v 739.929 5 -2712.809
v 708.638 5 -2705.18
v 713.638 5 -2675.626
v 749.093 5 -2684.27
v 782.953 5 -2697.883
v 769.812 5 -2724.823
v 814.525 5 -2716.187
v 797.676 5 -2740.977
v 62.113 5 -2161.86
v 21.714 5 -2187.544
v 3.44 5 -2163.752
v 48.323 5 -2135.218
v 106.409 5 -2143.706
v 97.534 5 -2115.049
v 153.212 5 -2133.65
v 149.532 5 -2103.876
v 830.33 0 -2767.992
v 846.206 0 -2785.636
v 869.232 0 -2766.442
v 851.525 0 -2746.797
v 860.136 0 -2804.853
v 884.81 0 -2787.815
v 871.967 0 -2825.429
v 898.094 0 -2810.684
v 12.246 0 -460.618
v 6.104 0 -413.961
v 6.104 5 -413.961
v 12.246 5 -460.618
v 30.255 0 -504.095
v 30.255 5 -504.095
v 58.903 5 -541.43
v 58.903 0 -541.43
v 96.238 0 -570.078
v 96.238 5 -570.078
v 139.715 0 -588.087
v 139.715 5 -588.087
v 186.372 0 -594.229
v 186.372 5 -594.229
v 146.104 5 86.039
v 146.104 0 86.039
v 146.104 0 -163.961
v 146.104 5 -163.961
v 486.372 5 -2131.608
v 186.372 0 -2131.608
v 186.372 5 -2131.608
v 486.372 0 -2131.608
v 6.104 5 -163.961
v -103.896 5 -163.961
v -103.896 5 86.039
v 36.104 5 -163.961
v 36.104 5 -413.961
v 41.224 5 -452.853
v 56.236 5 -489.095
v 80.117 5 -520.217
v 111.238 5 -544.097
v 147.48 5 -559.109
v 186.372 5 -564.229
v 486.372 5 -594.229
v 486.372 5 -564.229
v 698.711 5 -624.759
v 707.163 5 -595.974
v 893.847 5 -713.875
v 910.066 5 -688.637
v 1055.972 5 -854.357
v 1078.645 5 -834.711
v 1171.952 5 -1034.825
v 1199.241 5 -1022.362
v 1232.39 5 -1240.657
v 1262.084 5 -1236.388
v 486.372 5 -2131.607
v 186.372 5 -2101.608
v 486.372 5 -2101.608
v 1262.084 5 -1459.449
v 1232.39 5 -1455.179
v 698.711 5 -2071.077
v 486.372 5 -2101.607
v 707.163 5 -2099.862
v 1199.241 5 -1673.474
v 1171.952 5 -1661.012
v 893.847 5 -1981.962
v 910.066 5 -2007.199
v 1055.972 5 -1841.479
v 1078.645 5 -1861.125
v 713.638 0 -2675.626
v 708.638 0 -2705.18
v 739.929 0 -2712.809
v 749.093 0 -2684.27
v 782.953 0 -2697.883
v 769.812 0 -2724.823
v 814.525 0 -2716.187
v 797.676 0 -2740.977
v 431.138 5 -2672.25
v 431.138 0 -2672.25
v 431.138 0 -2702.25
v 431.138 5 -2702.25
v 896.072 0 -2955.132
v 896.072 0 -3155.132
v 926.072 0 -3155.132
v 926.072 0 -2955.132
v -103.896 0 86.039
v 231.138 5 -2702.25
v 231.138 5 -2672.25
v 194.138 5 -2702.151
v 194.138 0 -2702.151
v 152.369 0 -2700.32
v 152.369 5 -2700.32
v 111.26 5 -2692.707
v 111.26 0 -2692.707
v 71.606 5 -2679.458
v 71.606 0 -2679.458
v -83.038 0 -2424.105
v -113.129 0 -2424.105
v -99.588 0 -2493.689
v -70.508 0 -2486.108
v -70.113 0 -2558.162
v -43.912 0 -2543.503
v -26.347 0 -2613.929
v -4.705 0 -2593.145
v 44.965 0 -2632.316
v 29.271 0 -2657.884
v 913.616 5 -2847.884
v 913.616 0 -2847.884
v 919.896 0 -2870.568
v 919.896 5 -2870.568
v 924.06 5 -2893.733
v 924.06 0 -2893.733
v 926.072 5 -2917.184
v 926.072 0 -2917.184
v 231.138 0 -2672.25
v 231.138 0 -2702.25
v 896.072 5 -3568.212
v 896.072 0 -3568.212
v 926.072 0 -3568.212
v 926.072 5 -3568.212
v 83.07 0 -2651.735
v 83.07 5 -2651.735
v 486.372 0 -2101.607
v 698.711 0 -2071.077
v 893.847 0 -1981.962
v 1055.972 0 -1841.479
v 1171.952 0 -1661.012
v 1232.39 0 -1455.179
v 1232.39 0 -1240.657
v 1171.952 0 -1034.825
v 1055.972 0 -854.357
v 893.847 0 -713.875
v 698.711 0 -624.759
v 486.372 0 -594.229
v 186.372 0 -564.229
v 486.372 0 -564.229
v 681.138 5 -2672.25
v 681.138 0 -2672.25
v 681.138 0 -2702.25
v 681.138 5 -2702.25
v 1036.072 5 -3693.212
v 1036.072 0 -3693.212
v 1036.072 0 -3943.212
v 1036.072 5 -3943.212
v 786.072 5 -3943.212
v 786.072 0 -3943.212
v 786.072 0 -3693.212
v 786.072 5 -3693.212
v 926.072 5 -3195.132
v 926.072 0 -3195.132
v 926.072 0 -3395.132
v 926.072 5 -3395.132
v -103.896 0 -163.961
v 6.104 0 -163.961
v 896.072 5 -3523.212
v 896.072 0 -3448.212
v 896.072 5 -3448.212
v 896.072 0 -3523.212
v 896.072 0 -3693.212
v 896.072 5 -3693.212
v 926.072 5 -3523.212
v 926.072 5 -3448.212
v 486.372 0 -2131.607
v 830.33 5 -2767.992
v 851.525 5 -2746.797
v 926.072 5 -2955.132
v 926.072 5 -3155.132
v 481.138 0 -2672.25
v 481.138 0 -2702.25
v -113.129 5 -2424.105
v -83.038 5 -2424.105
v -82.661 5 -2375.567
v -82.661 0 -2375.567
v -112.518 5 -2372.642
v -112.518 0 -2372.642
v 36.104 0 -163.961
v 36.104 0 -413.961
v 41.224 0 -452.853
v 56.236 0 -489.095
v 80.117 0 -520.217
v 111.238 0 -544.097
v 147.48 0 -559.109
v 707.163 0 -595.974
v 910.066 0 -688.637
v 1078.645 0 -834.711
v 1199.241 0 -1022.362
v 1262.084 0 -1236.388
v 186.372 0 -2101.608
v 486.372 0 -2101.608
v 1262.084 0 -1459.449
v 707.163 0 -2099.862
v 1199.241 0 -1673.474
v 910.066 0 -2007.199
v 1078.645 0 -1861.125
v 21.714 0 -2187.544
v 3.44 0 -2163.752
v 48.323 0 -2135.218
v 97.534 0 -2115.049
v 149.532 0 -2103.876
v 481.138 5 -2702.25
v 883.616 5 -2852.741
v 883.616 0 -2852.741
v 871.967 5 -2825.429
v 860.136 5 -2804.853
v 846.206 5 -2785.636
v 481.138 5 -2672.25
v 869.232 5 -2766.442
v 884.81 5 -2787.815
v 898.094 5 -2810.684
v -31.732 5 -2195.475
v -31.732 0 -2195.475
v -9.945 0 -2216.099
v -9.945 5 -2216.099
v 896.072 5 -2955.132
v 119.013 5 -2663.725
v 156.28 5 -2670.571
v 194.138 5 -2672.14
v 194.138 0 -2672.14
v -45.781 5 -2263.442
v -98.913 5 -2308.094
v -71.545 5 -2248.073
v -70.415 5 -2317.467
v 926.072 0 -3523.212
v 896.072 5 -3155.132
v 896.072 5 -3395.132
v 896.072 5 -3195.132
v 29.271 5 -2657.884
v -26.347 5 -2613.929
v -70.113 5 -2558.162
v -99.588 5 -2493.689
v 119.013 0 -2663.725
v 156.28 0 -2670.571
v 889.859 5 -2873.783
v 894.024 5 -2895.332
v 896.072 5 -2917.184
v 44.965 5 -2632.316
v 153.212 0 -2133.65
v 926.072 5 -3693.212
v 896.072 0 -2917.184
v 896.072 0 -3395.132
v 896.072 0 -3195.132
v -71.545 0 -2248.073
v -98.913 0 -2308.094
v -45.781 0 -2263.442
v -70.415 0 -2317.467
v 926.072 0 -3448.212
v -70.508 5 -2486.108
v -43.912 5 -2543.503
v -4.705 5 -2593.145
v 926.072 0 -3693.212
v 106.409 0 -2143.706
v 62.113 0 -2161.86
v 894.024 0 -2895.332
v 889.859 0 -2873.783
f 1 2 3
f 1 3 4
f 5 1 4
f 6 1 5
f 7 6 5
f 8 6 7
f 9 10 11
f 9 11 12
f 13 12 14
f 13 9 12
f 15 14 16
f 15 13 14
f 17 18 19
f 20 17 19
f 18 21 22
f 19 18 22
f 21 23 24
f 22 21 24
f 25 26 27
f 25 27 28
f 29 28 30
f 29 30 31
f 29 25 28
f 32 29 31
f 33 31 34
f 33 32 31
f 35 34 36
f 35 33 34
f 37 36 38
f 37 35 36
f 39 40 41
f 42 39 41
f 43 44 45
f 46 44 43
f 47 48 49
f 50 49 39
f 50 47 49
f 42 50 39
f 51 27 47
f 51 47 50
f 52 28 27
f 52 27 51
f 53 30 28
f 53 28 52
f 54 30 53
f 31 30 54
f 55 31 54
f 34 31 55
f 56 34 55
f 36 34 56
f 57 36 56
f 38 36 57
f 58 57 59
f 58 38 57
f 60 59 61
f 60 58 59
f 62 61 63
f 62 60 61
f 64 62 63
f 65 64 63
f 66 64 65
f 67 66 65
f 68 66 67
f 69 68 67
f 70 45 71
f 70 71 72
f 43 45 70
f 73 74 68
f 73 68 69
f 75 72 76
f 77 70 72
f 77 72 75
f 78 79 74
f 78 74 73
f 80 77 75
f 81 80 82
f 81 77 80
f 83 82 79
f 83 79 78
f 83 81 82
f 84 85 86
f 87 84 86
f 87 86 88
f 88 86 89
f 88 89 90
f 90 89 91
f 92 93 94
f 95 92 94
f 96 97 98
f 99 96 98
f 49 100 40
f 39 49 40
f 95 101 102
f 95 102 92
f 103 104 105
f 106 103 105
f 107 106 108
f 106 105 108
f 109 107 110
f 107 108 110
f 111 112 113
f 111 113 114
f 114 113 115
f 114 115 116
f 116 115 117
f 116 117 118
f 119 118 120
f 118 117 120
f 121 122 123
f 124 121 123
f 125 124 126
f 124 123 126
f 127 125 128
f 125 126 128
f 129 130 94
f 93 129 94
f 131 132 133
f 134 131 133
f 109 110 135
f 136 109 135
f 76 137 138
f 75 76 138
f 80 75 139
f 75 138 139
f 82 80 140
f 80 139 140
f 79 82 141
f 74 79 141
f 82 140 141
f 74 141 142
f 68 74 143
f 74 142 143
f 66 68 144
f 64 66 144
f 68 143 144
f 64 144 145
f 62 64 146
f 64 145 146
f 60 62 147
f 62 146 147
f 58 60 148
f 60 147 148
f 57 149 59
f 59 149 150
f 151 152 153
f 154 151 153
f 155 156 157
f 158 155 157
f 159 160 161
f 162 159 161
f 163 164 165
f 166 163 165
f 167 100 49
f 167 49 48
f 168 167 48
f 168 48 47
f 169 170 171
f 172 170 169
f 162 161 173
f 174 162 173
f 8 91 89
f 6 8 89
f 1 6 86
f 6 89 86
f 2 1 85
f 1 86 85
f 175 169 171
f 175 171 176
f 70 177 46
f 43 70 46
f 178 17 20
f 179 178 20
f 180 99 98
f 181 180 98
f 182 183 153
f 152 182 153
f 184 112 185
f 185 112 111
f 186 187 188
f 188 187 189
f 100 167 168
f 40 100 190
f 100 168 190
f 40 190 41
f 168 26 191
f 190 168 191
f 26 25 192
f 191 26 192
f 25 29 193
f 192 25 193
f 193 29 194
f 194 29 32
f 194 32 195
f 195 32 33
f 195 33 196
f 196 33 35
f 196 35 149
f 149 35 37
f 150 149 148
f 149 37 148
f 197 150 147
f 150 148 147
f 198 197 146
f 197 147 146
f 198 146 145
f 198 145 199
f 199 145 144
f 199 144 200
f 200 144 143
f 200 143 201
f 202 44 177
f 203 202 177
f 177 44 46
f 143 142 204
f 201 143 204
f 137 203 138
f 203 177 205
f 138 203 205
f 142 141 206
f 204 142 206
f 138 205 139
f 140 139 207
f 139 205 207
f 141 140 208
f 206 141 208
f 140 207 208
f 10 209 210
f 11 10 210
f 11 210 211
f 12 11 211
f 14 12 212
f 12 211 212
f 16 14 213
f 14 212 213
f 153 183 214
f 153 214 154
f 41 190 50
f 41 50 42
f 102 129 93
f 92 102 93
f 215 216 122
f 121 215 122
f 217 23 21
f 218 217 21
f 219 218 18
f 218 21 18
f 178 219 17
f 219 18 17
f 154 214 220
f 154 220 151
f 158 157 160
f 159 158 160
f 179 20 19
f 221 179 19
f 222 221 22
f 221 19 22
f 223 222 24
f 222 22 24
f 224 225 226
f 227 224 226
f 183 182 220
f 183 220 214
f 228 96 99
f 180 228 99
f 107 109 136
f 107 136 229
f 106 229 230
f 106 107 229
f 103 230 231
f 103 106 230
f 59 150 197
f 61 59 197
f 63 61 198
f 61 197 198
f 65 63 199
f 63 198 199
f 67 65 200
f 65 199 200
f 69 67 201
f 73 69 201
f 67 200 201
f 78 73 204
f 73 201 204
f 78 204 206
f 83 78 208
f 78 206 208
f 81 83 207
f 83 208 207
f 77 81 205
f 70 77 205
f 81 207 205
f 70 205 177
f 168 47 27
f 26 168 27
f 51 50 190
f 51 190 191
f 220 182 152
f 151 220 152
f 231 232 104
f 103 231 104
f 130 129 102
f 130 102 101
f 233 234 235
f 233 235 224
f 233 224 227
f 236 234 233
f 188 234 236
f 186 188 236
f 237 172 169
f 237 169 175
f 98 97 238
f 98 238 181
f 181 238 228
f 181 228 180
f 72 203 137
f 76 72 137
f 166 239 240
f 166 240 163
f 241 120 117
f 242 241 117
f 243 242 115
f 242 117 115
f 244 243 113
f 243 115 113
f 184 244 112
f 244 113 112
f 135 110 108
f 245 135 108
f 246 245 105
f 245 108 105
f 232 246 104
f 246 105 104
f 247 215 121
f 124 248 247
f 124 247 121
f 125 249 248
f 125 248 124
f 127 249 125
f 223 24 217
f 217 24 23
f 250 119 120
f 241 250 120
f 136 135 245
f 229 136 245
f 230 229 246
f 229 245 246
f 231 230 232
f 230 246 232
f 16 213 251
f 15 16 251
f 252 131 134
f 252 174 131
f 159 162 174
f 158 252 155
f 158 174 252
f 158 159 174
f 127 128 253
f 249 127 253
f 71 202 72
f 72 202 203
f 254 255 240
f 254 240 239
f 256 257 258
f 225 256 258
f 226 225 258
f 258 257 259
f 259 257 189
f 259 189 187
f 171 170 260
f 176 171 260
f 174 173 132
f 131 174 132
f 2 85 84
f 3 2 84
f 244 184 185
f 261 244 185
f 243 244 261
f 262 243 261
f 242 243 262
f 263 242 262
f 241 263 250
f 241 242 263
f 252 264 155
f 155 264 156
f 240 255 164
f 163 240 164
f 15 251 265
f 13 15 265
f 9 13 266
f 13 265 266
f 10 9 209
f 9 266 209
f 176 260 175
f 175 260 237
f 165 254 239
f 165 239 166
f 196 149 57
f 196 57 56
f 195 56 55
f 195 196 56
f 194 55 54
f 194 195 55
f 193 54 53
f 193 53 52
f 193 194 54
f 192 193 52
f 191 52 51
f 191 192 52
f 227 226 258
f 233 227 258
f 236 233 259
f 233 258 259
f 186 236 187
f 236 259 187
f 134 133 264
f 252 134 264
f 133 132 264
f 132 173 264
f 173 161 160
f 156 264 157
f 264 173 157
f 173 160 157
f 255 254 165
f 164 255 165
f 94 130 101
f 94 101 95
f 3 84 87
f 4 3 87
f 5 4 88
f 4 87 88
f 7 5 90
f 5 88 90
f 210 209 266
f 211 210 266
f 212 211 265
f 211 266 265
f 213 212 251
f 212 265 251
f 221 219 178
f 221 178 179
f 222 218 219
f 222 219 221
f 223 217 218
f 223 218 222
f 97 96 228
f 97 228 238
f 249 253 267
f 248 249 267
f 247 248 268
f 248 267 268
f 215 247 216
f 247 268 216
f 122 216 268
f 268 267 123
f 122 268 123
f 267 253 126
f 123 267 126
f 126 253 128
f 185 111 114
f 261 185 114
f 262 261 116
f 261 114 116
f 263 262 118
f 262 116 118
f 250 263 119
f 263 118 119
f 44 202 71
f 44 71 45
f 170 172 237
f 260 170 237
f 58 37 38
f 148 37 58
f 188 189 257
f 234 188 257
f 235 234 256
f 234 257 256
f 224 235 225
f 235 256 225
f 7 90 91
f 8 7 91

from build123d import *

# Parameters (mm, degrees)
SKETCH1_W              = 250
SKETCH1_H              = 250
BOSS_EXTRUDE1_DEPTH    = 5
SKETCH2_W              = 30
SKETCH2_H              = 250
BOSS_EXTRUDE2_DEPTH    = 5
BOSS_EXTRUDE3_DEPTH    = 5
SKETCH7_W              = 300
SKETCH7_H              = 30
BOSS_EXTRUDE4_DEPTH    = 5
BOSS_EXTRUDE5_DEPTH    = 5
SKETCH10_W             = 300
SKETCH10_H             = 30
BOSS_EXTRUDE6_DEPTH    = 5
BOSS_EXTRUDE7_DEPTH    = 5
BOSS_EXTRUDE7_2_DEPTH  = 5
BOSS_EXTRUDE7_3_DEPTH  = 5
BOSS_EXTRUDE7_4_DEPTH  = 5
SKETCH12_W             = 200
SKETCH12_H             = 30
BOSS_EXTRUDE8_DEPTH    = 5
BOSS_EXTRUDE8_2_DEPTH  = 5
BOSS_EXTRUDE9_DEPTH    = 5
BOSS_EXTRUDE9_2_DEPTH  = 5
BOSS_EXTRUDE9_3_DEPTH  = 5
SKETCH14_W             = 30
SKETCH14_H             = 200
BOSS_EXTRUDE10_DEPTH   = 5
BOSS_EXTRUDE10_2_DEPTH = 5
SKETCH14_H_2           = 75
BOSS_EXTRUDE10_3_DEPTH = 5
BOSS_EXTRUDE10_4_DEPTH = 5


with BuildPart() as part:
    # Sketch1 → Boss-Extrude1 (new body)
    with BuildSketch(Plane(origin=(0, 0, 0), x_dir=(1, 0, 0), z_dir=(0, 1, 0))):
        with Locations((21.103896104, 38.961038961)):
            Rectangle(SKETCH1_W, SKETCH1_H)
    extrude(amount=BOSS_EXTRUDE1_DEPTH)



with BuildPart() as body_2:
    # Sketch2 → Boss-Extrude2 (new body)
    with BuildSketch(Plane(origin=(0, 5, 0), x_dir=(1, 0, 0), z_dir=(0, 1, 0))):
        with Locations((21.103896104, 288.961038961)):
            Rectangle(SKETCH2_W, SKETCH2_H)
    extrude(amount=-BOSS_EXTRUDE2_DEPTH)

    # Sketch6 → Boss-Extrude3 (add)
    with BuildSketch(Plane(origin=(0, 0, 0), x_dir=(1, 0, 0), z_dir=(0, 1, 0))):
        with BuildLine():
            Line((186.372355095, 594.229497953), (186.372355095, 564.229497953))
            ThreePointArc((186.372355095, 564.229497953), (80.116508744, 520.216885312), (36.103896104, 413.961038961))
            Line((36.103896104, 413.961038961), (6.103896104, 413.961038961))
            ThreePointArc((6.103896104, 413.961038961), (58.903305308, 541.430088748), (186.372355095, 594.229497953))
        make_face()
    extrude(amount=BOSS_EXTRUDE3_DEPTH)

    # Sketch7 → Boss-Extrude4 (add)
    with BuildSketch(Plane(origin=(0, 0, 0), x_dir=(1, 0, 0), z_dir=(0, 1, 0))):
        with Locations((336.372355095, 579.229497953)):
            Rectangle(SKETCH7_W, SKETCH7_H)
    extrude(amount=BOSS_EXTRUDE4_DEPTH)


with BuildPart() as part_1:
    add(part.part)

    add(body_2.part)  # Boss-Extrude5 merges body 2
    # Sketch8 → Boss-Extrude5 (add)
    with BuildSketch(Plane(origin=(0, 0, 0), x_dir=(1, 0, 0), z_dir=(0, 1, 0))):
        with BuildLine():
            Line((486.372355095, 2131.607057749), (486.372355095, 2101.607057749))
            ThreePointArc((486.372355095, 2101.607057749), (1240.061134994, 1347.918277851), (486.372355095, 594.229497953))
            Line((486.372355095, 594.229497953), (186.372355095, 594.229497953))
            ThreePointArc((186.372355095, 594.229497953), (58.903305308, 541.430088748), (6.103896104, 413.961038961))
            Line((6.103896104, 413.961038961), (6.103896104, 163.961038961))
            Line((6.103896104, 163.961038961), (36.103896104, 163.961038961))
            Line((36.103896104, 163.961038961), (36.103896104, 413.961038961))
            ThreePointArc((36.103896104, 413.961038961), (80.116508744, 520.216885312), (186.372355095, 564.229497953))
            Line((186.372355095, 564.229497953), (486.372355095, 564.229497953))
            ThreePointArc((486.372355095, 564.229497953), (1270.061134994, 1347.918277851), (486.372355095, 2131.607057749))
        make_face()
    extrude(amount=BOSS_EXTRUDE5_DEPTH)

    # Sketch10 → Boss-Extrude6 (add)
    with BuildSketch(Plane(origin=(0, 0, 0), x_dir=(1, 0, 0), z_dir=(0, 1, 0))):
        with Locations((336.372355095, 2116.608277851)):
            Rectangle(SKETCH10_W, SKETCH10_H)
    extrude(amount=BOSS_EXTRUDE6_DEPTH)


with BuildPart() as body_2_2:
    # Sketch11 → Boss-Extrude7 (new body)
    with BuildSketch(Plane(origin=(0, 0, 0), x_dir=(1, 0, 0), z_dir=(0, 1, 0))):
        with BuildLine():
            Line((194.138193135, 2672.13994615), (194.138193135, 2702.151095344))
            ThreePointArc((194.138193135, 2702.151095344), (131.681935279, 2697.229802428), (71.605683596, 2679.457710455))
            Line((71.605683596, 2679.457710455), (83.070060163, 2651.7346502))
            ThreePointArc((83.070060163, 2651.7346502), (137.526703553, 2667.801823345), (194.138193135, 2672.13994615))
        make_face()
    extrude(amount=BOSS_EXTRUDE7_DEPTH)


with BuildPart() as body_3:
    # Sketch11 → Boss-Extrude7 2 (new body)
    with BuildSketch(Plane(origin=(0, 0, 0), x_dir=(1, 0, 0), z_dir=(0, 1, 0))):
        with BuildLine():
            Line((44.964556313, 2632.315689233), (29.271272289, 2657.883654278))
            ThreePointArc((29.271272289, 2657.883654278), (-70.112980729, 2558.161610757), (-113.129498421, 2424.104552318))
            Line((-113.129498421, 2424.104552318), (-83.038229419, 2424.104552318))
            ThreePointArc((-83.038229419, 2424.104552318), (-43.912046021, 2543.502751874), (44.964556313, 2632.315689233))
        make_face()
    extrude(amount=BOSS_EXTRUDE7_2_DEPTH)


with BuildPart() as body_4:
    # Sketch11 → Boss-Extrude7 3 (new body)
    with BuildSketch(Plane(origin=(0, 0, 0), x_dir=(1, 0, 0), z_dir=(0, 1, 0))):
        with BuildLine():
            Line((-82.66072222, 2375.567393394), (-112.51772113, 2372.641711242))
            ThreePointArc((-112.51772113, 2372.641711242), (-86.881851845, 2277.329681582), (-31.732320704, 2195.475481892))
            Line((-31.732320704, 2195.475481892), (-9.945210372, 2216.098813907))
            ThreePointArc((-9.945210372, 2216.098813907), (-59.585694469, 2289.776359551), (-82.66072222, 2375.567393394))
        make_face()
    extrude(amount=BOSS_EXTRUDE7_3_DEPTH)


with BuildPart() as body_5:
    # Sketch11 → Boss-Extrude7 4 (new body)
    with BuildSketch(Plane(origin=(0, 0, 0), x_dir=(1, 0, 0), z_dir=(0, 1, 0))):
        with BuildLine():
            Line((21.713850904, 2187.543901905), (3.44022883, 2163.751576749))
            ThreePointArc((3.44022883, 2163.751576749), (72.481138399, 2124.041671747), (149.53232629, 2103.876399771))
            Line((149.53232629, 2103.876399771), (153.212383901, 2133.649830476))
            ThreePointArc((153.212383901, 2133.649830476), (83.85806324, 2151.800734793), (21.713850904, 2187.543901905))
        make_face()
    extrude(amount=BOSS_EXTRUDE7_4_DEPTH)


with BuildPart() as body_6:
    # Sketch12 → Boss-Extrude8 (new body)
    with BuildSketch(Plane(origin=(0, 0, 0), x_dir=(1, 0, 0), z_dir=(0, 1, 0))):
        with Locations((331.138193135, 2687.249898038)):
            Rectangle(SKETCH12_W, SKETCH12_H)
    extrude(amount=BOSS_EXTRUDE8_DEPTH)


with BuildPart() as body_7:
    # Sketch12 → Boss-Extrude8 2 (new body)
    with BuildSketch(Plane(origin=(0, 0, 0), x_dir=(1, 0, 0), z_dir=(0, 1, 0))):
        with Locations((581.138193135, 2687.249898038)):
            Rectangle(SKETCH12_W, SKETCH12_H)
    extrude(amount=BOSS_EXTRUDE8_2_DEPTH)


with BuildPart() as body_8:
    # Sketch13 → Boss-Extrude9 (new body)
    with BuildSketch(Plane(origin=(0, 0, 0), x_dir=(1, 0, 0), z_dir=(0, 1, 0))):
        with BuildLine():
            Line((814.524837295, 2716.186900912), (797.676028873, 2740.97663625))
            ThreePointArc((797.676028873, 2740.97663625), (755.085921794, 2718.281057155), (708.638465423, 2705.179899646))
            Line((708.638465423, 2705.179899646), (713.637920847, 2675.626240501))
            ThreePointArc((713.637920847, 2675.626240501), (766.266726809, 2690.470934491), (814.524837295, 2716.186900912))
        make_face()
    extrude(amount=BOSS_EXTRUDE9_DEPTH)


with BuildPart() as body_9:
    # Sketch13 → Boss-Extrude9 2 (new body)
    with BuildSketch(Plane(origin=(0, 0, 0), x_dir=(1, 0, 0), z_dir=(0, 1, 0))):
        with BuildLine():
            Line((898.093524537, 2810.684387291), (871.967165315, 2825.42933062))
            ThreePointArc((871.967165315, 2825.42933062), (853.424296595, 2795.060872341), (830.330084802, 2767.99172717))
            Line((830.330084802, 2767.99172717), (851.524580826, 2746.797231146))
            ThreePointArc((851.524580826, 2746.797231146), (877.298037122, 2776.926526297), (898.093524537, 2810.684387291))
        make_face()
    extrude(amount=BOSS_EXTRUDE9_2_DEPTH)


with BuildPart() as body_10:
    # Sketch13 → Boss-Extrude9 3 (new body)
    with BuildSketch(Plane(origin=(0, 0, 0), x_dir=(1, 0, 0), z_dir=(0, 1, 0))):
        with BuildLine():
            Line((926.071913934, 2917.183618837), (896.071913934, 2917.183618837))
            ThreePointArc((896.071913934, 2917.183618837), (892.203801963, 2884.506266075), (883.615550676, 2852.74129144))
            Line((883.615550676, 2852.74129144), (913.615550676, 2847.884198566))
            ThreePointArc((913.615550676, 2847.884198566), (922.245200786, 2882.102251934), (926.071913934, 2917.183618837))
        make_face()
    extrude(amount=BOSS_EXTRUDE9_3_DEPTH)


with BuildPart() as body_11:
    # Sketch14 → Boss-Extrude10 (new body)
    with BuildSketch(Plane(origin=(0, 0, 0), x_dir=(1, 0, 0), z_dir=(0, 1, 0))):
        with Locations((911.071913934, 3055.131798486)):
            Rectangle(SKETCH14_W, SKETCH14_H)
    extrude(amount=BOSS_EXTRUDE10_DEPTH)


with BuildPart() as body_12:
    # Sketch14 → Boss-Extrude10 2 (new body)
    with BuildSketch(Plane(origin=(0, 0, 0), x_dir=(1, 0, 0), z_dir=(0, 1, 0))):
        with Locations((911.071913934, 3295.131798486)):
            Rectangle(SKETCH14_W, SKETCH14_H)
    extrude(amount=BOSS_EXTRUDE10_2_DEPTH)


with BuildPart() as body_13:
    # Sketch14 → Boss-Extrude10 3 (new body)
    with BuildSketch(Plane(origin=(0, 0, 0), x_dir=(1, 0, 0), z_dir=(0, 1, 0))):
        with Locations((911.071913934, 3485.711929371)):
            Rectangle(SKETCH14_W, SKETCH14_H_2)
    extrude(amount=BOSS_EXTRUDE10_3_DEPTH)


with BuildPart() as body_14:
    # Sketch14 → Boss-Extrude10 4 (new body)
    with BuildSketch(Plane(origin=(0, 0, 0), x_dir=(1, 0, 0), z_dir=(0, 1, 0))):
        Polygon((896.071913934, 3568.211929371), (926.071913934, 3568.211929371), (926.071913934, 3693.211929371), (1036.071913934, 3693.211929371), (1036.071913934, 3943.211929371), (786.071913934, 3943.211929371), (786.071913934, 3693.211929371), (896.071913934, 3693.211929371), align=None)
    extrude(amount=BOSS_EXTRUDE10_4_DEPTH)


solid = Compound([part_1.part, body_2_2.part, body_3.part, body_4.part, body_5.part, body_6.part, body_7.part, body_8.part, body_9.part, body_10.part, body_11.part, body_12.part, body_13.part, body_14.part])
